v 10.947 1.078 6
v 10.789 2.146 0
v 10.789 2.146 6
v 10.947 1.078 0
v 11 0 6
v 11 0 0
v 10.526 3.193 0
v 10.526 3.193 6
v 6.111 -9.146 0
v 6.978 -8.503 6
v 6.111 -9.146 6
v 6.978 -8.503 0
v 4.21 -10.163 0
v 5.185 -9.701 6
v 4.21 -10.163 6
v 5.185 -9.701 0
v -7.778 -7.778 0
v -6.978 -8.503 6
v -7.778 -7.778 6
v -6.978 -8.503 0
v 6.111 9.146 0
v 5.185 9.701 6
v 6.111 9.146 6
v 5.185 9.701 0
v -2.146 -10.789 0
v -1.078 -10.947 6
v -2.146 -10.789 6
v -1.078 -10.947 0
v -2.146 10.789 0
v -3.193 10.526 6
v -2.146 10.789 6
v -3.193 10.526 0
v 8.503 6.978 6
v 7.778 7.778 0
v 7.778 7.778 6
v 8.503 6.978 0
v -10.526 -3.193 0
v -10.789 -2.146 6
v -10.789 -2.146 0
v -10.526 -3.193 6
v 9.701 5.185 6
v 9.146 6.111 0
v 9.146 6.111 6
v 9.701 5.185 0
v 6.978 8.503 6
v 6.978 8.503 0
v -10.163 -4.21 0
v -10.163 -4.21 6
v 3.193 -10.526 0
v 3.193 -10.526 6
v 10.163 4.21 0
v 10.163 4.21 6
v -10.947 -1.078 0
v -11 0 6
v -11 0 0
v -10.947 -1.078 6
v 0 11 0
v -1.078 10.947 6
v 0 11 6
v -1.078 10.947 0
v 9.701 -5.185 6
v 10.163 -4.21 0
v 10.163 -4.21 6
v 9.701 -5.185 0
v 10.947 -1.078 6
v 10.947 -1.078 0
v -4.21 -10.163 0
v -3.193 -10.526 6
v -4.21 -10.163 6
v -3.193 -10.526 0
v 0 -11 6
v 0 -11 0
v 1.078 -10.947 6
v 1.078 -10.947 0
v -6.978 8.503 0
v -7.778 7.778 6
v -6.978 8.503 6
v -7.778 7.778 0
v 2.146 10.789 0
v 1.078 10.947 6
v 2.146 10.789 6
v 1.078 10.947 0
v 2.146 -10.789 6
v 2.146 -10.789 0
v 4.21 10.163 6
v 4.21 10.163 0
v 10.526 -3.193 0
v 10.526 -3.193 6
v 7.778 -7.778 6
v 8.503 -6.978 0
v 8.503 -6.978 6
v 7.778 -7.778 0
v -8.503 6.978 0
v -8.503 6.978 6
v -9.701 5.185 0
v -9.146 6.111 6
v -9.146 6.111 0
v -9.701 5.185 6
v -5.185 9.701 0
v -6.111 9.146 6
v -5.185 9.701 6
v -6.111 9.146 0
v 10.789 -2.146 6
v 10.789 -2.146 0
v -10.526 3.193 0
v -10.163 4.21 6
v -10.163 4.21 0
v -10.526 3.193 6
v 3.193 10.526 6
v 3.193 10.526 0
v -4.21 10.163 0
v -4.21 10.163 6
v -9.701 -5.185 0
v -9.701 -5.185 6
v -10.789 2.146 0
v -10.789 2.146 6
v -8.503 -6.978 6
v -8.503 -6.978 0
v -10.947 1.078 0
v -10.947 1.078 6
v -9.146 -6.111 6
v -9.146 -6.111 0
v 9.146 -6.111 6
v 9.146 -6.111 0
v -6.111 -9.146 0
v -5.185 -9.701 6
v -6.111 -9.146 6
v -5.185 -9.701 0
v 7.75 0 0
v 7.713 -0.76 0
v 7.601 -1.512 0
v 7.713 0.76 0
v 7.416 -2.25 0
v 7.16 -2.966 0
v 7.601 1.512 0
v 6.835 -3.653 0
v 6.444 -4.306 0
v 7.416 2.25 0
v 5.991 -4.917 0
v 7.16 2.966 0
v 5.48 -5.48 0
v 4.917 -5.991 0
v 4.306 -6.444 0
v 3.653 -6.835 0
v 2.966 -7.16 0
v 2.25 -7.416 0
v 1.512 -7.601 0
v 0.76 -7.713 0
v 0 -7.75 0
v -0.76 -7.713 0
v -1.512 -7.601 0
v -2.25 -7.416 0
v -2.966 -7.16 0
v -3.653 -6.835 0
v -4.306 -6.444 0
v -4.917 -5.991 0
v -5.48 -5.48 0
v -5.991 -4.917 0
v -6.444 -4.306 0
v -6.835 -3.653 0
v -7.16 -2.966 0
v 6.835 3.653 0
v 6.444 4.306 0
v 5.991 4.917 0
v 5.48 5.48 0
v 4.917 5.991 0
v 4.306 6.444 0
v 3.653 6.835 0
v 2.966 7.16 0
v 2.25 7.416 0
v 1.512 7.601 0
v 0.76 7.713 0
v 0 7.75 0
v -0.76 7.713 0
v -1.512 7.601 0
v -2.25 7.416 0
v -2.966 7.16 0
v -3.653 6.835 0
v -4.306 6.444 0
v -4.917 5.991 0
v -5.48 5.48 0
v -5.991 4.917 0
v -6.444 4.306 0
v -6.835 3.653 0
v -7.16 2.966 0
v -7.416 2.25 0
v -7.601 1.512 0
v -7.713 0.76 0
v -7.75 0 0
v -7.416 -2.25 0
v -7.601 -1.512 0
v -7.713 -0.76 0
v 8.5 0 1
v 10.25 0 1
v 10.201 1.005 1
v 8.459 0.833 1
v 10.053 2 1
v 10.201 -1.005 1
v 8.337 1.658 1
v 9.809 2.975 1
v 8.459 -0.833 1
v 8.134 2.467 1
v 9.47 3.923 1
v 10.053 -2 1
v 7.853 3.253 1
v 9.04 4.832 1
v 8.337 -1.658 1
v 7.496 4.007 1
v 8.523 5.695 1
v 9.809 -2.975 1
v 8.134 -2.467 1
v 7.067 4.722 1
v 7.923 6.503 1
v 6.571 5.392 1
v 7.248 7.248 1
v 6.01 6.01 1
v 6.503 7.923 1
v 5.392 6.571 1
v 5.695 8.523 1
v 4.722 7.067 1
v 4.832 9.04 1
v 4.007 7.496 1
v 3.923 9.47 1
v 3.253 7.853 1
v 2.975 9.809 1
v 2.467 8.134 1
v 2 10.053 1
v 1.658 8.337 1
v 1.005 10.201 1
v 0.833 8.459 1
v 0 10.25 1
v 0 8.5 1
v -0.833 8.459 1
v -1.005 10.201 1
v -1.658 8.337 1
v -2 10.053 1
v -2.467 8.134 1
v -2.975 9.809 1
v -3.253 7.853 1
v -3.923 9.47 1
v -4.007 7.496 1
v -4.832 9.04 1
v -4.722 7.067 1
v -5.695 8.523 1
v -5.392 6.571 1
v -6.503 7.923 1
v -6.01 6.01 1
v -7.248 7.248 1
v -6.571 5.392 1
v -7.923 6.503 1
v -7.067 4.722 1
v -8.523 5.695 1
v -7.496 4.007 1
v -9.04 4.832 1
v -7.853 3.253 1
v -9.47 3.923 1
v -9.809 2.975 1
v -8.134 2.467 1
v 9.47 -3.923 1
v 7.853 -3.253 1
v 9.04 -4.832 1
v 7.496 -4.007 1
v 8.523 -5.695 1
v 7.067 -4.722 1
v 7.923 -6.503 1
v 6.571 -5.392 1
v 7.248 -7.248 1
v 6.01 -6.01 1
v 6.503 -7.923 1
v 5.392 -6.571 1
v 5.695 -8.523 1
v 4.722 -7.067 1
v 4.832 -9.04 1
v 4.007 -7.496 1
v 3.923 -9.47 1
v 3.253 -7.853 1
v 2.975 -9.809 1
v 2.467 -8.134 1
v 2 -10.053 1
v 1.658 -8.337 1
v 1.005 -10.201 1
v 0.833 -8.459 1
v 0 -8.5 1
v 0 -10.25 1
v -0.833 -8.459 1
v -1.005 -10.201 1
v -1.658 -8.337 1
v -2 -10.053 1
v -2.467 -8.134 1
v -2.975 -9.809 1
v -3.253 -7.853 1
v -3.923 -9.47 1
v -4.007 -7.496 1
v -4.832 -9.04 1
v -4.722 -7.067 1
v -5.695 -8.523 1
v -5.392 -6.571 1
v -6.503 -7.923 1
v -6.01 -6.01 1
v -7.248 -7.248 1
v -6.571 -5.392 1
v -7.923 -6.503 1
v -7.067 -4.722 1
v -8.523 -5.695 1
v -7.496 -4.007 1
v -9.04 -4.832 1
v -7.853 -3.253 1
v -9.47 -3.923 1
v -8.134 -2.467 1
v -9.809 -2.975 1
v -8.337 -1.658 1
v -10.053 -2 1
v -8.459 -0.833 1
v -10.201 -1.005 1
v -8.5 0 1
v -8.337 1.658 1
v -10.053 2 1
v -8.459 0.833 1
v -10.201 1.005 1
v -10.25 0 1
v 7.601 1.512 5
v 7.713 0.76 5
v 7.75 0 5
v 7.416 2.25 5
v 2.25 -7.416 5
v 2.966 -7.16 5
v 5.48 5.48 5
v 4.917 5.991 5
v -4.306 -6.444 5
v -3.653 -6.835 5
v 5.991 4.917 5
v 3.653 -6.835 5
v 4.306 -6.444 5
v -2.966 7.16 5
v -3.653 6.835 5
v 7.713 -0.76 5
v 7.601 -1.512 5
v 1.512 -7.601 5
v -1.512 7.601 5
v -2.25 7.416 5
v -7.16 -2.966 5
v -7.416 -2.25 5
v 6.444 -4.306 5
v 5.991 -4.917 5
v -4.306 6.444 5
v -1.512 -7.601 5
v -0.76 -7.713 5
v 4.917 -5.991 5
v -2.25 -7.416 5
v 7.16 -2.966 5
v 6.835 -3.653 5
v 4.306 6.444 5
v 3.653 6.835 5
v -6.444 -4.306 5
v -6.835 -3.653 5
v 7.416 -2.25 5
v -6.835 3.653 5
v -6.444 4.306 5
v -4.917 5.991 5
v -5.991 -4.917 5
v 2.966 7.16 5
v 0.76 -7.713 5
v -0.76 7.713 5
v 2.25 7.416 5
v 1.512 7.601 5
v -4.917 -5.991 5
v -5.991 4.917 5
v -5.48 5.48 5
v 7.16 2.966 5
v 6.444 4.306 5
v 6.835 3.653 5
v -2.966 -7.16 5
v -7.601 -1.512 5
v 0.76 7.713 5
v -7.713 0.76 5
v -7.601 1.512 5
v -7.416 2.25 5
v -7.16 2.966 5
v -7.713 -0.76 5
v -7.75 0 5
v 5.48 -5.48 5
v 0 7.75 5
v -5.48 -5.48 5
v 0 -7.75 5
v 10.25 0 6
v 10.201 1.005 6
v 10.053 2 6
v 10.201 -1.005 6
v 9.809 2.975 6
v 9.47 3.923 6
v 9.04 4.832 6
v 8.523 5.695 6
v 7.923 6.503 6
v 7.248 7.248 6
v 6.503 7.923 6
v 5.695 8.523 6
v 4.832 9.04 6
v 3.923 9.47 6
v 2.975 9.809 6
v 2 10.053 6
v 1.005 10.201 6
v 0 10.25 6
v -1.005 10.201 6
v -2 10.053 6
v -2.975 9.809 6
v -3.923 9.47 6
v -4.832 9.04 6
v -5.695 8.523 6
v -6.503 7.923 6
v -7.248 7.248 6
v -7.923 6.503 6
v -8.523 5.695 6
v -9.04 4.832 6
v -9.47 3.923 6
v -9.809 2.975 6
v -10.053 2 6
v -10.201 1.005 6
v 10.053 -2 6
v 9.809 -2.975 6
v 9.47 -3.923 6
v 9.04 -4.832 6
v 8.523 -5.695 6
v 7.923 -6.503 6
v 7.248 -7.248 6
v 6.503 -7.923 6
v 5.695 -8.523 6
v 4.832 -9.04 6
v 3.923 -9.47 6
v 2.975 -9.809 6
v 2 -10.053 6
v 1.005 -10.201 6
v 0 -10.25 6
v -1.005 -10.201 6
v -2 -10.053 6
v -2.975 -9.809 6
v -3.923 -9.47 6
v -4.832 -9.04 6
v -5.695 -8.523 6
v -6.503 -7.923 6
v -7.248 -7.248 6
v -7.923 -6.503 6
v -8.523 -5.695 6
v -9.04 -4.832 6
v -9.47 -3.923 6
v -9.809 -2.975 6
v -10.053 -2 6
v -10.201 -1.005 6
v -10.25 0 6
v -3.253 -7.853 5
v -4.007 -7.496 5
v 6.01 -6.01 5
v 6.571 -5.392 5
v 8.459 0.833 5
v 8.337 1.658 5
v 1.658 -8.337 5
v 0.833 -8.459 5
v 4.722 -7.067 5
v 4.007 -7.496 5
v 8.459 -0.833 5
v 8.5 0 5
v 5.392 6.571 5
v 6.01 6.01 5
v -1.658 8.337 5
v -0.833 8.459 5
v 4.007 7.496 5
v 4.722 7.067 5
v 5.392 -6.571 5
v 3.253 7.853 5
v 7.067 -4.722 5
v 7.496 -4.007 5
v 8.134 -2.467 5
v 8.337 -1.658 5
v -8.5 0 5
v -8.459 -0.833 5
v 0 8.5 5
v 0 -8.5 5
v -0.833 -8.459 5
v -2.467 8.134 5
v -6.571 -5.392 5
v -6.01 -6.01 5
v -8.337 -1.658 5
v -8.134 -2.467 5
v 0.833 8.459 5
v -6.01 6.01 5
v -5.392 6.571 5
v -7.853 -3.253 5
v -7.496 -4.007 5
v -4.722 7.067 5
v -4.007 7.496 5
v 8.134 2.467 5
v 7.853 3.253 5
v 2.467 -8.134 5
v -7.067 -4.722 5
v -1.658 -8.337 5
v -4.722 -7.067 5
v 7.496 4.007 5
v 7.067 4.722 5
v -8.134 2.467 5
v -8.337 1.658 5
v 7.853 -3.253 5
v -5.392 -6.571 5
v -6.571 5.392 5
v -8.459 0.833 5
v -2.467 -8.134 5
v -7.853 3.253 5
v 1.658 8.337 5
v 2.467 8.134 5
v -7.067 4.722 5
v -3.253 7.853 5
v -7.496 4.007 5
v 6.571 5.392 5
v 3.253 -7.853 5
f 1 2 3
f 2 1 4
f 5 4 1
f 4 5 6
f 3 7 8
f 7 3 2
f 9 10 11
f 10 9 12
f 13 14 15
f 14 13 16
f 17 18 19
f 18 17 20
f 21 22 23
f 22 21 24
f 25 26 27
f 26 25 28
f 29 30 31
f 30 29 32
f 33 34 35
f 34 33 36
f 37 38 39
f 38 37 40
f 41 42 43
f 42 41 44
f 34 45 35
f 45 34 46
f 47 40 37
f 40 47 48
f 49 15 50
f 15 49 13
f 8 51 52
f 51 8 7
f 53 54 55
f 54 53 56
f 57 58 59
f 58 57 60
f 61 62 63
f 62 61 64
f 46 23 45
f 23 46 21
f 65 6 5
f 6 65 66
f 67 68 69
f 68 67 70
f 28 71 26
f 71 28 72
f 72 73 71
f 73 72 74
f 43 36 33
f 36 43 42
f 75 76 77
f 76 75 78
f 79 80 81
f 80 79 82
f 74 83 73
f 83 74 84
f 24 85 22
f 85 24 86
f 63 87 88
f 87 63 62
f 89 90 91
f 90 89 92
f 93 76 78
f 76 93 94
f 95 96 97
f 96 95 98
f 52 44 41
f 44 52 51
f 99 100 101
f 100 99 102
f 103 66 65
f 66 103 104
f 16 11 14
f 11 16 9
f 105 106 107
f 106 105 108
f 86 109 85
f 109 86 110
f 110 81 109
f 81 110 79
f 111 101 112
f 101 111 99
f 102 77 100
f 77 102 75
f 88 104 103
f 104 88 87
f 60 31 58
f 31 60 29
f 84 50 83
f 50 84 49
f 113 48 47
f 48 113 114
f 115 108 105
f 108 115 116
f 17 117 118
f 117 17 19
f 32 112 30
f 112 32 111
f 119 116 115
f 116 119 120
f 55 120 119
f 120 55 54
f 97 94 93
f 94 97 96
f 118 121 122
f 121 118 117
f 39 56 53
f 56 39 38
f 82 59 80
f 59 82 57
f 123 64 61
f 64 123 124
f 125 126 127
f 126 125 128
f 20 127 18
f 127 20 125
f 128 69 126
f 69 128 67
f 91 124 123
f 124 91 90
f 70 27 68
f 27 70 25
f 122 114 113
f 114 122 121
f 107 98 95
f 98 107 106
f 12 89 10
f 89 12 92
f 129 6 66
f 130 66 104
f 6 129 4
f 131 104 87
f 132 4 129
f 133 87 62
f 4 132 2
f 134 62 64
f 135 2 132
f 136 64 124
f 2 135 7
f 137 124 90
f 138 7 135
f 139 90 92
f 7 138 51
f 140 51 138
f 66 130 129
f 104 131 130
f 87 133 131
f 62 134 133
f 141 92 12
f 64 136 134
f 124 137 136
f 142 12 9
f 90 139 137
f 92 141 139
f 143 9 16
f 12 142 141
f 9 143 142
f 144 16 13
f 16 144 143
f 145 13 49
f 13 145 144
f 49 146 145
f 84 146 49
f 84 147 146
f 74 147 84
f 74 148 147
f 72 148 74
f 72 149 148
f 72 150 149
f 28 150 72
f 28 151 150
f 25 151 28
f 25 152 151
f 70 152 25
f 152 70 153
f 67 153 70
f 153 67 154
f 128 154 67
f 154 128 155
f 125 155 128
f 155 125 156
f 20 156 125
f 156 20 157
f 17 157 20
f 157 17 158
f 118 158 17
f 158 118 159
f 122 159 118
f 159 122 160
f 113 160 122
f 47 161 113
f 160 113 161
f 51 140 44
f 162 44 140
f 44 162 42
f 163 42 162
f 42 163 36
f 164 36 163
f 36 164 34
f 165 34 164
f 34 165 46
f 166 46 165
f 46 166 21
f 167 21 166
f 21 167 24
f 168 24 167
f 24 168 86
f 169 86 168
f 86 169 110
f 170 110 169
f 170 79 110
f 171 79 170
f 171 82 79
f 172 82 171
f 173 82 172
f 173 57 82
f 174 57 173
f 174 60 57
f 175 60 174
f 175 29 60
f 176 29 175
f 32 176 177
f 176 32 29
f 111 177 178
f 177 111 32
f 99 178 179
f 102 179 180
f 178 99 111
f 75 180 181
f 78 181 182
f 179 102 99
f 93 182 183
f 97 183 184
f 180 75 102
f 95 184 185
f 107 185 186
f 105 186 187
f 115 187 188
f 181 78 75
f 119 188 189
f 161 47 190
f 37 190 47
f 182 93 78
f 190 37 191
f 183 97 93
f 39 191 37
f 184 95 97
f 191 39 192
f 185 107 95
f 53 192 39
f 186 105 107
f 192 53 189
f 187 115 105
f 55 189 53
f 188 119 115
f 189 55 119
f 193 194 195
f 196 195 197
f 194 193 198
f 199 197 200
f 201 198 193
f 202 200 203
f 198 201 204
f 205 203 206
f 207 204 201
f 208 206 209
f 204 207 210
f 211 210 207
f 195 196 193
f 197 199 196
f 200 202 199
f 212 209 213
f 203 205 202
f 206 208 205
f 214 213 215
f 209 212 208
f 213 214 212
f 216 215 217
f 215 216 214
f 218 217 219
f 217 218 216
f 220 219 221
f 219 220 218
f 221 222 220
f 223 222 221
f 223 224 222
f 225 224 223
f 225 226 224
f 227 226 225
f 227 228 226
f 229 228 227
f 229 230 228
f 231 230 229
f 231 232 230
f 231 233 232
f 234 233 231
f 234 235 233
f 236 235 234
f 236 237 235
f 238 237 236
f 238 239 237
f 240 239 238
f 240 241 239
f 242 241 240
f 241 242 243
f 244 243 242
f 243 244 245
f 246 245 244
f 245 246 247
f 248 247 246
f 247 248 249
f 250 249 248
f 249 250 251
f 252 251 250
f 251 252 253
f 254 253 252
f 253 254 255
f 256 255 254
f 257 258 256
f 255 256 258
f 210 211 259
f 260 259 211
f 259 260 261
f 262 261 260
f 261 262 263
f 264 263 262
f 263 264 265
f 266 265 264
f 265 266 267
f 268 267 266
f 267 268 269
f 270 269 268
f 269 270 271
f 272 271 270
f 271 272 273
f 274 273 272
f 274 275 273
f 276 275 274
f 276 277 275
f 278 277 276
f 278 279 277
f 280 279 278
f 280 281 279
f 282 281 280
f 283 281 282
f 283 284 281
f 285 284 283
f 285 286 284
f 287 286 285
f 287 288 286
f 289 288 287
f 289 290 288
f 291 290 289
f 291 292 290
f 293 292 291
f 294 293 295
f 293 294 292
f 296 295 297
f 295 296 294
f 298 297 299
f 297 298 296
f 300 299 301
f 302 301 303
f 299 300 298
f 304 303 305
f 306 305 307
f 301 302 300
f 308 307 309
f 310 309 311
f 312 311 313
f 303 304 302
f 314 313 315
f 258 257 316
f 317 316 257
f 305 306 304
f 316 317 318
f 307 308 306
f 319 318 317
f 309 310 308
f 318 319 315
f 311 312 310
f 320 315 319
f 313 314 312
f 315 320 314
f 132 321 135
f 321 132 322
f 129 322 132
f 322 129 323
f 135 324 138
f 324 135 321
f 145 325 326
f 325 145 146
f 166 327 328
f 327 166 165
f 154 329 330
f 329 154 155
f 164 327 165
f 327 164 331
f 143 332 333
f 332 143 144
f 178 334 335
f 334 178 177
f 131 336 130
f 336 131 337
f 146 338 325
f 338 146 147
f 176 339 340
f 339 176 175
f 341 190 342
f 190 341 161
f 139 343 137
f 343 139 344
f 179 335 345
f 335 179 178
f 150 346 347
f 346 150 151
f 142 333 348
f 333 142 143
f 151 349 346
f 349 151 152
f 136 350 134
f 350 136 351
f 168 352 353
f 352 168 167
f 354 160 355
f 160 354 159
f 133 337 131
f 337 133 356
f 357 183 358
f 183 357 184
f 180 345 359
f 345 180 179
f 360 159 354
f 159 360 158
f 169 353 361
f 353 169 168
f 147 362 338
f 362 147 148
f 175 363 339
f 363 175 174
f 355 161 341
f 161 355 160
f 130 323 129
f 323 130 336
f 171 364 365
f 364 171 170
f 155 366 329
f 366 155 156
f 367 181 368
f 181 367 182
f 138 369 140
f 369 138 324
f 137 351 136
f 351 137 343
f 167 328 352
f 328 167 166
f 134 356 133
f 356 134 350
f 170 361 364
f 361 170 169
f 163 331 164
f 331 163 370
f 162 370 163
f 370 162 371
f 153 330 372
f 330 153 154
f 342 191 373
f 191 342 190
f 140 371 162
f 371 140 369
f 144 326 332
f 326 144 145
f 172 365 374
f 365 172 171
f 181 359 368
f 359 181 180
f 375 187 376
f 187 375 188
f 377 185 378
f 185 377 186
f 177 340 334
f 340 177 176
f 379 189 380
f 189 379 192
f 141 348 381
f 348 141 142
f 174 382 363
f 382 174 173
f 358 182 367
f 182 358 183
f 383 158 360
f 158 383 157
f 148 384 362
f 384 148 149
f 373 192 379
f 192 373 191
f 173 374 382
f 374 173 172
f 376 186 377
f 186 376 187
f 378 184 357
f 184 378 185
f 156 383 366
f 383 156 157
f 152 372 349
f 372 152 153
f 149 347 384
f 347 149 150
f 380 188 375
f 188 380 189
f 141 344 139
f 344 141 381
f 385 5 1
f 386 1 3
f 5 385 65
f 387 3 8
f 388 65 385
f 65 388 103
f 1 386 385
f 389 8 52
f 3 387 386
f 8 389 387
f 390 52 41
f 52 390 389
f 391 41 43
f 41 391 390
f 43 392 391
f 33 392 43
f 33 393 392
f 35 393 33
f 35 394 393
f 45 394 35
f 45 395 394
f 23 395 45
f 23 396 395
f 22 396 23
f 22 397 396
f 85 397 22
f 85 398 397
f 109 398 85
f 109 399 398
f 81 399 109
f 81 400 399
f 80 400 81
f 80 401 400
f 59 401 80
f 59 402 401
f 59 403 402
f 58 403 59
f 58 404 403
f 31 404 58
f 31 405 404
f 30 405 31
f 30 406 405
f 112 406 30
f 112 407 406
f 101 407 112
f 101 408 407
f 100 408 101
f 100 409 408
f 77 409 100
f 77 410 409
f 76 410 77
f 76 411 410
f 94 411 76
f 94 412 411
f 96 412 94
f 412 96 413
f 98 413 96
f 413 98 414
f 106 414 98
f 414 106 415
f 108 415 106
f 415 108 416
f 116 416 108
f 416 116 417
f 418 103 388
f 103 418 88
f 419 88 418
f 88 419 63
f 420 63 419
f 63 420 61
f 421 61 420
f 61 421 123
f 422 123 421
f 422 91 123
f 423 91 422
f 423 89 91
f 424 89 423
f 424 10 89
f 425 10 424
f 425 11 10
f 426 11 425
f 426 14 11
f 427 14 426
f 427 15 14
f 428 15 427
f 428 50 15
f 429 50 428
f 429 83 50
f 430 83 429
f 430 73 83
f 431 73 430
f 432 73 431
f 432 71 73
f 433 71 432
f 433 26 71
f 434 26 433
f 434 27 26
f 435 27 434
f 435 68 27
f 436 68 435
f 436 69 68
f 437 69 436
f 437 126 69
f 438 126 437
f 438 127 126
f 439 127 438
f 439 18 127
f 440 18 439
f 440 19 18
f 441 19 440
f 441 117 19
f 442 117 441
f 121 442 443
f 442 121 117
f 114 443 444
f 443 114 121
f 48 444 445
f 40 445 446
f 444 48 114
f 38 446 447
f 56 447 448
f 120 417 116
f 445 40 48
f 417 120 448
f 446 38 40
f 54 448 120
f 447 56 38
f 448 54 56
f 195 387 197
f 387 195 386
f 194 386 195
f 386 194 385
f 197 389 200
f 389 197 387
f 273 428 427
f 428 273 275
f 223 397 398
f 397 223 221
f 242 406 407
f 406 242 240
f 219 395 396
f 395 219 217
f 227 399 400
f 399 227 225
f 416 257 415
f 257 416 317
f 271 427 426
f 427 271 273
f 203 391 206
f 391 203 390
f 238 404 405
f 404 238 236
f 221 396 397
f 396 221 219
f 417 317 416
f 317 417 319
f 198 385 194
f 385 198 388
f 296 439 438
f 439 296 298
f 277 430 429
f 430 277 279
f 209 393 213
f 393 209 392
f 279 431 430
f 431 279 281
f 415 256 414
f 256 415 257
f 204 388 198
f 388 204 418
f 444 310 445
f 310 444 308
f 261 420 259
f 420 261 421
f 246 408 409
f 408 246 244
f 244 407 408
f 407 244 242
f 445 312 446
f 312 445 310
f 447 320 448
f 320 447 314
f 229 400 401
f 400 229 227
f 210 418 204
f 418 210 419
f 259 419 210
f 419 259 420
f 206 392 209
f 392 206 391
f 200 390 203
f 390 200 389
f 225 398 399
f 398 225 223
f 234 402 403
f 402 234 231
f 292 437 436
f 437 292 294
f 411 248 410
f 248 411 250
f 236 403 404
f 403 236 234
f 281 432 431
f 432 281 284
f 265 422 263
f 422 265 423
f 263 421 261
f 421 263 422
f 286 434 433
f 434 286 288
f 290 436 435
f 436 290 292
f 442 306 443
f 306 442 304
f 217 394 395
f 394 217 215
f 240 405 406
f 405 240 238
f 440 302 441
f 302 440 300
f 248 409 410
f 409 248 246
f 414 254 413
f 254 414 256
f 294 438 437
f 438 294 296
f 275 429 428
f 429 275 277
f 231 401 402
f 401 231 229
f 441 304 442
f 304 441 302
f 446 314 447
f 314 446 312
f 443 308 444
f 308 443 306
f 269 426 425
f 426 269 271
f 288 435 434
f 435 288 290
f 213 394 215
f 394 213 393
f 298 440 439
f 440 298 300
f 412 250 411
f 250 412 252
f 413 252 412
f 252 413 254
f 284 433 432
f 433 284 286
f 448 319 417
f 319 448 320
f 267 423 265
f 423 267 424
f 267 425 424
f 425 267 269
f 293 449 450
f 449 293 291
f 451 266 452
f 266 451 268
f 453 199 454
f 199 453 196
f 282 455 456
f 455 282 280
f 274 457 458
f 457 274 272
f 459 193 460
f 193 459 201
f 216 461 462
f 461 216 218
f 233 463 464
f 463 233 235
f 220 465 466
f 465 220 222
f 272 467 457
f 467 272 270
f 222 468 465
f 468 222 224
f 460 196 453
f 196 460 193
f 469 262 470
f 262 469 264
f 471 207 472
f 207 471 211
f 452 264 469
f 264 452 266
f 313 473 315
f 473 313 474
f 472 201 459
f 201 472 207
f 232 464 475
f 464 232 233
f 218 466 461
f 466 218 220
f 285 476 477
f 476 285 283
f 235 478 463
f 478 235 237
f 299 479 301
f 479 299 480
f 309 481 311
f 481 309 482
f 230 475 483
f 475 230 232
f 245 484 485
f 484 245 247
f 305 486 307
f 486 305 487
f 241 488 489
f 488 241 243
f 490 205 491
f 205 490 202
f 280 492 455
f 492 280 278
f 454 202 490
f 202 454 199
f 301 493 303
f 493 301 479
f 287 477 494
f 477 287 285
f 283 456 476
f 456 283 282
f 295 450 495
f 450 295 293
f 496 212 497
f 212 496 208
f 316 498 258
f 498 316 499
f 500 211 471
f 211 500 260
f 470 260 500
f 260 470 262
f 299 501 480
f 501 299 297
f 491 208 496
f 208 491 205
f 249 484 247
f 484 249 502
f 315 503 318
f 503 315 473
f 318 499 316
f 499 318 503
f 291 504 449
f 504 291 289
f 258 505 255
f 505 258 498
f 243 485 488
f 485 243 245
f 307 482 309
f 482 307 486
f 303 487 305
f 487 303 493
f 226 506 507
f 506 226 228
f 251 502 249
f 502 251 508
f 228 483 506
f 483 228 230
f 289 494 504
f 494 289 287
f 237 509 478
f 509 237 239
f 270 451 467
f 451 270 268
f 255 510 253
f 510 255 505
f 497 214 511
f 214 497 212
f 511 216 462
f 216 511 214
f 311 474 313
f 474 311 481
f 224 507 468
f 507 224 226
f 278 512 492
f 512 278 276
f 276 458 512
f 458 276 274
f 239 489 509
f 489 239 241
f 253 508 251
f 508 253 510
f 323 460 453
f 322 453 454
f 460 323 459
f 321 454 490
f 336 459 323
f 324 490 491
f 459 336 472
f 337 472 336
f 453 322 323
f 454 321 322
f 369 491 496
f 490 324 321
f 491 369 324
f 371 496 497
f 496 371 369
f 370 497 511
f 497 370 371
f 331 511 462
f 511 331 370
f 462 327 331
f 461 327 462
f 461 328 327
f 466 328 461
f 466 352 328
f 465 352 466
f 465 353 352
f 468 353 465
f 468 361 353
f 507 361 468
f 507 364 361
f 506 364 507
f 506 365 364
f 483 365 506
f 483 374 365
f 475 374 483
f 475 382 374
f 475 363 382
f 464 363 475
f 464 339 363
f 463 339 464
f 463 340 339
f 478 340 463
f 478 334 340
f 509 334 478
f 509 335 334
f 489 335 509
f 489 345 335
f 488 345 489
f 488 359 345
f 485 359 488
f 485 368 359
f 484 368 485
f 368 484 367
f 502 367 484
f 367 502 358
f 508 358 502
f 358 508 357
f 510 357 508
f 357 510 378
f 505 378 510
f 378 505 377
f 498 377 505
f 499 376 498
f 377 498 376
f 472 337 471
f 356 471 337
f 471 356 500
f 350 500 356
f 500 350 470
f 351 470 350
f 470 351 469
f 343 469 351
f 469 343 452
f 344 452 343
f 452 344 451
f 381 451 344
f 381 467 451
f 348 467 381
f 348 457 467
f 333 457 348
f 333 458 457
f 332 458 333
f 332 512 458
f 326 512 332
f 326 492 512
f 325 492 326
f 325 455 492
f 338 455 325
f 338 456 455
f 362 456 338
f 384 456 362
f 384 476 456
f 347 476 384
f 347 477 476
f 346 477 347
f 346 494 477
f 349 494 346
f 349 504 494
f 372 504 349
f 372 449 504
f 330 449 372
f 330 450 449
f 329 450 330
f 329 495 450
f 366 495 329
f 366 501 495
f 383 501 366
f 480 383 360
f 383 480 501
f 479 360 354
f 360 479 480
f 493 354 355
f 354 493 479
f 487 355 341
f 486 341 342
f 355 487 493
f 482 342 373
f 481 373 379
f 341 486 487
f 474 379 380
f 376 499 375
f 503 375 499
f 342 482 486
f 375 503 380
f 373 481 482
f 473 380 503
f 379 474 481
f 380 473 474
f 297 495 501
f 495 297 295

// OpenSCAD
// Generated by SolidPython 1.1.3 on 2024-03-13 11:00:13


union() {
	translate(v = [0, 0, 0.5000000000]) {
		difference() {
			cylinder($fn = 64, center = true, h = 1, r = 11.0000000000);
			cylinder($fn = 64, center = true, h = 1, r = 7.7500000000);
		}
	}
	difference() {
		translate(v = [0, 0, 3.5000000000]) {
			cylinder($fn = 64, center = true, h = 5, r = 11.0000000000);
		}
		translate(v = [0, 0, 3.5000000000]) {
			cylinder($fn = 64, center = true, h = 5, r = 10.2500000000);
		}
	}
	difference() {
		translate(v = [0, 0, 3.0000000000]) {
			cylinder($fn = 64, center = true, h = 4, r = 8.5000000000);
		}
		translate(v = [0, 0, 3.0000000000]) {
			cylinder($fn = 64, center = true, h = 4, r = 7.7500000000);
		}
	}
}
/***********************************************
*********      SolidPython code:      **********
************************************************
 
import solid
import os.path as osp
import os 

def save_model(model,base_path,base_name):
    if not osp.exists(base_path):
        os.makedirs(base_path)
    scad_path=osp.join(base_path,base_name+".scad")
    solid.scad_render_to_file(model,osp.join(scad_path))


version="final_cnc"
#base_path="./designs/plasma_racks/4mm_well_0.5inch_diam_device_"+version+"/"
base_path="./orders/cnc_order_final_march_13th/"
base_name="single_adapter_0.5inch_"+version
adapter_diam=22
water_well_diam_out=20.5
water_well_diam_in=17
device_diam=15.5
water_well_height=4
adapter_height=5
floor_thickness=1

#floor
floor = solid.cylinder(r=adapter_diam/2.0, h=floor_thickness, segments=64, center = True)
floor_hole = solid.cylinder(r=device_diam/2.0, h=floor_thickness, segments=64, center = True)
floor = solid.difference()(floor,floor_hole)
floor = solid.translate([0,0,floor_thickness/2.0])(floor)


#plate wells
well = solid.cylinder(r=adapter_diam/2.0, h=adapter_height, segments=64, center = True)
well = solid.translate([0,0,adapter_height/2.0+floor_thickness])(well)
well_inner = solid.cylinder(r=water_well_diam_out/2.0, h=adapter_height, segments=64, center = True)
well_inner = solid.translate([0,0,adapter_height/2.0+floor_thickness])(well_inner)
well = solid.difference()(well,well_inner)


##water wells
water_well_out = solid.cylinder(r=water_well_diam_in/2.0, h=water_well_height, segments=64, center = True)
water_well_out = solid.translate([0,0,water_well_height/2.0+floor_thickness])(water_well_out)
water_well_in = solid.cylinder(r=device_diam/2.0, h=water_well_height, segments=64, center = True)
water_well_in = solid.translate([0,0,water_well_height/2.0+floor_thickness])(water_well_in)
water_well=solid.difference()(water_well_out,water_well_in)

adapter= solid.union()(floor,well,water_well)


save_model(adapter,base_path,base_name)
 
 
************************************************/
